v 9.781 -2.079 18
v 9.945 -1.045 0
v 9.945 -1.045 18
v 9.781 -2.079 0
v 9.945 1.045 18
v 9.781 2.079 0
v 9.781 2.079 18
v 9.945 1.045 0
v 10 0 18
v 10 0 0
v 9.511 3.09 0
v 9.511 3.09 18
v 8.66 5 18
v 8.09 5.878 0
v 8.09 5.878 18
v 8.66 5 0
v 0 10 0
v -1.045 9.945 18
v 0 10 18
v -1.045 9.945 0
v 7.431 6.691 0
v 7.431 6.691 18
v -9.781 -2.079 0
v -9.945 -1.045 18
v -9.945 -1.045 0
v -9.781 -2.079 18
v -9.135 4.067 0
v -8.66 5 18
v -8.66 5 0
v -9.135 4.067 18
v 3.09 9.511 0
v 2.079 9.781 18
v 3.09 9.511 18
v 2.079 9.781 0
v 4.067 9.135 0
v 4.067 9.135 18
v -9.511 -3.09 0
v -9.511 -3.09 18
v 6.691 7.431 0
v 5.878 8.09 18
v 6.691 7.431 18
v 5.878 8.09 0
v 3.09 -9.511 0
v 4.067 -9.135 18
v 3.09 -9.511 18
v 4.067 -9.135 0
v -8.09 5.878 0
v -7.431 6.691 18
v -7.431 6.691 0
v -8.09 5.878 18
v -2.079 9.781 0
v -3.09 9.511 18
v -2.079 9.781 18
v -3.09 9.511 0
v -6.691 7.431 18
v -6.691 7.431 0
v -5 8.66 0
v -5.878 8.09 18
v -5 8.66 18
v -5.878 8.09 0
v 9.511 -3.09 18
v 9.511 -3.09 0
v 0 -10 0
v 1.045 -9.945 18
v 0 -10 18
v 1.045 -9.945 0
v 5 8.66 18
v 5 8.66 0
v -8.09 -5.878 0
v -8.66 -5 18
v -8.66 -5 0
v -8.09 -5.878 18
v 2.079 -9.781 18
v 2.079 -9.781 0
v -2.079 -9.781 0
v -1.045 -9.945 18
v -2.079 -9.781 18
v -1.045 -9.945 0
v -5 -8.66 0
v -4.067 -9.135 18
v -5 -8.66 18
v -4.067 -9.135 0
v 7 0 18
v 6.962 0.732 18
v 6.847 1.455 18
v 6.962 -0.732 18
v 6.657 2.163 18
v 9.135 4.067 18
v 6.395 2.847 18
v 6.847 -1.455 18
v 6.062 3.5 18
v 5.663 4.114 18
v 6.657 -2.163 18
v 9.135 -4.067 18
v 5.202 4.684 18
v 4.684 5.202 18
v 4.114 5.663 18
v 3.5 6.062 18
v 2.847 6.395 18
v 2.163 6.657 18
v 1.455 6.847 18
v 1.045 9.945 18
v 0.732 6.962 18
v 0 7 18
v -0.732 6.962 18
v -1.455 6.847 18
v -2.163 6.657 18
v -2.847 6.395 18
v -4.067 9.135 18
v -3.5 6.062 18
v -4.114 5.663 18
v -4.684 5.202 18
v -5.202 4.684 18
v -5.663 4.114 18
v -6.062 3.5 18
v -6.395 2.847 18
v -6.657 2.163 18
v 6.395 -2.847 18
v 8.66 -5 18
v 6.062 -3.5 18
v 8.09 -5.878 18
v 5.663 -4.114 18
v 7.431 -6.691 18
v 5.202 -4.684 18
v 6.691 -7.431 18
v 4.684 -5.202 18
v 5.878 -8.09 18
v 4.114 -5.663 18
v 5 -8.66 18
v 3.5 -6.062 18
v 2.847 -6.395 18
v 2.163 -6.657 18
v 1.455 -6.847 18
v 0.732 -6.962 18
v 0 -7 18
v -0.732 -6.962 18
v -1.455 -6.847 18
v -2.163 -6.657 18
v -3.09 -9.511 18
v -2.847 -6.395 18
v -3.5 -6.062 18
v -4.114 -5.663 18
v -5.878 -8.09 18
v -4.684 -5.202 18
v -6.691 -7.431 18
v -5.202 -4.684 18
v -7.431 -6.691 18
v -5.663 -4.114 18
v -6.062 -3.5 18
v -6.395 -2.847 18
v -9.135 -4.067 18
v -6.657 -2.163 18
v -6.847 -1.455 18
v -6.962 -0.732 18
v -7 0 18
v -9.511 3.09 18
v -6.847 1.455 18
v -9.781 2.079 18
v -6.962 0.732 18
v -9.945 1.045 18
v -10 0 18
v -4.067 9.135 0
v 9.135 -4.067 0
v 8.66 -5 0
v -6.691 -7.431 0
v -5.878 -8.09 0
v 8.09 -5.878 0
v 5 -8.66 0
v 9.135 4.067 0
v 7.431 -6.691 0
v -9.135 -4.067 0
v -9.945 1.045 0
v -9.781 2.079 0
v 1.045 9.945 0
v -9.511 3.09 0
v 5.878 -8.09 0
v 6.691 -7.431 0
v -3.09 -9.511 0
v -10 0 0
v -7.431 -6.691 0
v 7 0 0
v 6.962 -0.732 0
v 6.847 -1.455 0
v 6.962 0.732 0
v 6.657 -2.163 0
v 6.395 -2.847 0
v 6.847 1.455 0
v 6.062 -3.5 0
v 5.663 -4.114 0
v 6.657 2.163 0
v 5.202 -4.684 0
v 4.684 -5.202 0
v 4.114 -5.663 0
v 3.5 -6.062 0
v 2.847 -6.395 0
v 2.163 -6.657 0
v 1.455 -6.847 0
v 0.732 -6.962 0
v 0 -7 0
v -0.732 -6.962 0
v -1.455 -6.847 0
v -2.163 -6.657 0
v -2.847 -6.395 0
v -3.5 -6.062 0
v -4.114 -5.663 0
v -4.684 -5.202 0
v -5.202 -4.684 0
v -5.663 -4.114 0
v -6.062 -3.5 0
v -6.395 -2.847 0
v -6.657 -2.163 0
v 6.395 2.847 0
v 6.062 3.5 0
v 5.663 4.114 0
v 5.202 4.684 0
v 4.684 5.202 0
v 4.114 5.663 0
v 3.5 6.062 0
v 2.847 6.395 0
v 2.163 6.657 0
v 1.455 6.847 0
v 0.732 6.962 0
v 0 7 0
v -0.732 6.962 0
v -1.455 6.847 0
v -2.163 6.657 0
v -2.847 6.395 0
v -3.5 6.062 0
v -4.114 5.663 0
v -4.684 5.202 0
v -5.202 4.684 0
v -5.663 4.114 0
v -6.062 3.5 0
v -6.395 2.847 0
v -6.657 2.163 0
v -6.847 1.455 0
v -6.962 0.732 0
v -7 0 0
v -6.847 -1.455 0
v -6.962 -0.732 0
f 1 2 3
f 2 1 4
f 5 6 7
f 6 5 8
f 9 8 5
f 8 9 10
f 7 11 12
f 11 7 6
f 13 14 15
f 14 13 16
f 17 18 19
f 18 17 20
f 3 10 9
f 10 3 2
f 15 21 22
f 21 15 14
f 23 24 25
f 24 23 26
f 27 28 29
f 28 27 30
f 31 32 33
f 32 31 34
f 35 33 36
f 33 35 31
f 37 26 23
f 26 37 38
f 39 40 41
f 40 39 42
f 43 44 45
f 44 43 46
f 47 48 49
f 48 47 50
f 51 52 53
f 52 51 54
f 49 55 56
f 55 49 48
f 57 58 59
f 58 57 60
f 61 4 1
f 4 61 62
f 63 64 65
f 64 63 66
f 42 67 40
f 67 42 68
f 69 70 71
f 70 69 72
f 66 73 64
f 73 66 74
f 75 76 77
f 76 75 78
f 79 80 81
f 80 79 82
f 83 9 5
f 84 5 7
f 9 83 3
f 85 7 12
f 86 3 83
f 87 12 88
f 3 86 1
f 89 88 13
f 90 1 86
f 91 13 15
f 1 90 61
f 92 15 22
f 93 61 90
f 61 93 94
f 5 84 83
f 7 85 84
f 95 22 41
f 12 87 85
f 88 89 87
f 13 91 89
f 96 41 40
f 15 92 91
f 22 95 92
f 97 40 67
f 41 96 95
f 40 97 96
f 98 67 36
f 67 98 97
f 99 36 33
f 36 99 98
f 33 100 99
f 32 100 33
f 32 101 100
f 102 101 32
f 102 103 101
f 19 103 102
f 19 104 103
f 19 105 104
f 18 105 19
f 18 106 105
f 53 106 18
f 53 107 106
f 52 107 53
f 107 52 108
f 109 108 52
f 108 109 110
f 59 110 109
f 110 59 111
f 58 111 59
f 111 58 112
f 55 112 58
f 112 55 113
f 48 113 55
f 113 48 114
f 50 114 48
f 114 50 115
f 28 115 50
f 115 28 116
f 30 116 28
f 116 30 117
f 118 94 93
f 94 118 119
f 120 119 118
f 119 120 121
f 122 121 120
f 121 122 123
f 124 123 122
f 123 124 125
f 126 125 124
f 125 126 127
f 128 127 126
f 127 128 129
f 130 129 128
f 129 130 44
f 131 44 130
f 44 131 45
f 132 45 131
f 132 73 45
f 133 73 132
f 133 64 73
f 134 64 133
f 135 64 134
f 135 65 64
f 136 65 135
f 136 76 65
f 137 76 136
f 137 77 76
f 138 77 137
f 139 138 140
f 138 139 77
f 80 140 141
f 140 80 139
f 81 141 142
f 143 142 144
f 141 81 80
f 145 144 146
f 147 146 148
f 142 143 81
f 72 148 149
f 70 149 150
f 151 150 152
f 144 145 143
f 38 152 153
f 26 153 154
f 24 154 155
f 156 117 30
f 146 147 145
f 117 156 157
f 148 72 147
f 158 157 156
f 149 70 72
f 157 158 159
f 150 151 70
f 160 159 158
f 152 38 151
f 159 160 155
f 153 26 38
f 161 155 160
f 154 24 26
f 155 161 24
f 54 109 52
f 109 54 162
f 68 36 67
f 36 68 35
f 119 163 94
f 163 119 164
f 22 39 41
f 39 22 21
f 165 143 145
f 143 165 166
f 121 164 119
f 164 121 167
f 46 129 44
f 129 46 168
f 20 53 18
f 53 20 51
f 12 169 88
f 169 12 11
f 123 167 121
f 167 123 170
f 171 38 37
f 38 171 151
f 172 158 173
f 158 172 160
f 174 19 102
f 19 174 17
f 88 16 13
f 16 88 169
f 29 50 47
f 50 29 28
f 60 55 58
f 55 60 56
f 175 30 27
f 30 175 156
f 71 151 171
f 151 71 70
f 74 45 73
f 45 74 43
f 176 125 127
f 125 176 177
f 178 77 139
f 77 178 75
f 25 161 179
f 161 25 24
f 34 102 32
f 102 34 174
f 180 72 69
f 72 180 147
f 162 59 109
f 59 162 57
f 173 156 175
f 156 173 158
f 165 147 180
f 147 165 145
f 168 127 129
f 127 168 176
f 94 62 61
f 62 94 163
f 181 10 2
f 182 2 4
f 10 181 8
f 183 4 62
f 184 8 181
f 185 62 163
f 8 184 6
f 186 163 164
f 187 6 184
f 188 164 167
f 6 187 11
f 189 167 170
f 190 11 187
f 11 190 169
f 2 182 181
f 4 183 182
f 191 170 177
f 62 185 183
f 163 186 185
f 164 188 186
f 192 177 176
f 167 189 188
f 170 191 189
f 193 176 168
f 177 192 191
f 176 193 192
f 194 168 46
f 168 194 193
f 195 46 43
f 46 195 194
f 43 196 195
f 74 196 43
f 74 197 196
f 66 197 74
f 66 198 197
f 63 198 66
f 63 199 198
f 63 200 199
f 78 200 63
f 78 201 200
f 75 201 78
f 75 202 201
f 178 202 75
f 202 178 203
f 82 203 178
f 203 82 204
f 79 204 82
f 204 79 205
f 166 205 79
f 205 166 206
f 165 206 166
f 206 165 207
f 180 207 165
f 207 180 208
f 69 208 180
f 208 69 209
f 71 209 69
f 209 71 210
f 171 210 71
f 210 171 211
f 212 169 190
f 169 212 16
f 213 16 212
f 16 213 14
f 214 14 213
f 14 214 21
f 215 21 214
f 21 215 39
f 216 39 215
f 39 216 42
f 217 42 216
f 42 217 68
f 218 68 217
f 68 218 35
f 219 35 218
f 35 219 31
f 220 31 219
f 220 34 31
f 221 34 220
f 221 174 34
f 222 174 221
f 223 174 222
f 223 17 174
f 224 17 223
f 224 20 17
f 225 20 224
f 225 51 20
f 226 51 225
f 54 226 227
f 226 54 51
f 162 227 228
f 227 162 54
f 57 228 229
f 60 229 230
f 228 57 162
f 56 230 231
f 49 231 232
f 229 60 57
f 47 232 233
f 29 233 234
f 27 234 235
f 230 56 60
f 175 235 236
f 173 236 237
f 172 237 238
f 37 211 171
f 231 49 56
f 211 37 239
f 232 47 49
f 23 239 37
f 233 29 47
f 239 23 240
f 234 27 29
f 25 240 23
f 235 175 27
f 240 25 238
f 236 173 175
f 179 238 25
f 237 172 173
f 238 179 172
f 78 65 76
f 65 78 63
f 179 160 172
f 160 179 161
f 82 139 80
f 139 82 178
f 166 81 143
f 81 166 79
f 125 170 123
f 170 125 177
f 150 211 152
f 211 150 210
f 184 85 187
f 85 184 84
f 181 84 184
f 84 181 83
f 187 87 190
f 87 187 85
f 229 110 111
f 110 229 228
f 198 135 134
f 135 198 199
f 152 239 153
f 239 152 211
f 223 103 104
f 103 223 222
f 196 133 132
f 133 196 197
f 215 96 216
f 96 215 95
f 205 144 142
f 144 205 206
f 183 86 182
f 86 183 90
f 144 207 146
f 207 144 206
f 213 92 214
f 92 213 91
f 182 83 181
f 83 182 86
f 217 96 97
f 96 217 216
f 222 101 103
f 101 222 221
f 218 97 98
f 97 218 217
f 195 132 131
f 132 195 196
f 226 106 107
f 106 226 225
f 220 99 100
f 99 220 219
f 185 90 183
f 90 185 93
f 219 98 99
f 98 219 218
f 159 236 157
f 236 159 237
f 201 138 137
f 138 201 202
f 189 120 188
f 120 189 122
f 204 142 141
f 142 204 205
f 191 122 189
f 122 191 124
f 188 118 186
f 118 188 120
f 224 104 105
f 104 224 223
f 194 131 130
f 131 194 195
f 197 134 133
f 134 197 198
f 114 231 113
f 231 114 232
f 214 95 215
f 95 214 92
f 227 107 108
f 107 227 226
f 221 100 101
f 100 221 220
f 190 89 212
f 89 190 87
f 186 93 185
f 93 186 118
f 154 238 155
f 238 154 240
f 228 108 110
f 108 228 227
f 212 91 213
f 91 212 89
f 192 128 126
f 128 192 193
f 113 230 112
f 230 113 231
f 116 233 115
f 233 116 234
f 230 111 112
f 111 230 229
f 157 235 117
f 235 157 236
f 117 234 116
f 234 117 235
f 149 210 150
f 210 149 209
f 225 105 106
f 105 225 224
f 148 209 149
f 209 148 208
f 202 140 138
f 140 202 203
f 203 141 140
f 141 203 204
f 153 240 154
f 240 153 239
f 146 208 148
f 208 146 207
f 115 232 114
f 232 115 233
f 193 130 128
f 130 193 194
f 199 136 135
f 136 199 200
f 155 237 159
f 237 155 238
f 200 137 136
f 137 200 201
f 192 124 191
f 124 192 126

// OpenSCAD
// Axle spacer tube.
$fn = 60;
eps = 0.02;
inner_d = 14;
outer_d = 20;
length = 18;
difference() { cylinder(d = outer_d, h = length); translate([0,0,-eps]) cylinder(d = inner_d, h = length + 2 * eps); }
